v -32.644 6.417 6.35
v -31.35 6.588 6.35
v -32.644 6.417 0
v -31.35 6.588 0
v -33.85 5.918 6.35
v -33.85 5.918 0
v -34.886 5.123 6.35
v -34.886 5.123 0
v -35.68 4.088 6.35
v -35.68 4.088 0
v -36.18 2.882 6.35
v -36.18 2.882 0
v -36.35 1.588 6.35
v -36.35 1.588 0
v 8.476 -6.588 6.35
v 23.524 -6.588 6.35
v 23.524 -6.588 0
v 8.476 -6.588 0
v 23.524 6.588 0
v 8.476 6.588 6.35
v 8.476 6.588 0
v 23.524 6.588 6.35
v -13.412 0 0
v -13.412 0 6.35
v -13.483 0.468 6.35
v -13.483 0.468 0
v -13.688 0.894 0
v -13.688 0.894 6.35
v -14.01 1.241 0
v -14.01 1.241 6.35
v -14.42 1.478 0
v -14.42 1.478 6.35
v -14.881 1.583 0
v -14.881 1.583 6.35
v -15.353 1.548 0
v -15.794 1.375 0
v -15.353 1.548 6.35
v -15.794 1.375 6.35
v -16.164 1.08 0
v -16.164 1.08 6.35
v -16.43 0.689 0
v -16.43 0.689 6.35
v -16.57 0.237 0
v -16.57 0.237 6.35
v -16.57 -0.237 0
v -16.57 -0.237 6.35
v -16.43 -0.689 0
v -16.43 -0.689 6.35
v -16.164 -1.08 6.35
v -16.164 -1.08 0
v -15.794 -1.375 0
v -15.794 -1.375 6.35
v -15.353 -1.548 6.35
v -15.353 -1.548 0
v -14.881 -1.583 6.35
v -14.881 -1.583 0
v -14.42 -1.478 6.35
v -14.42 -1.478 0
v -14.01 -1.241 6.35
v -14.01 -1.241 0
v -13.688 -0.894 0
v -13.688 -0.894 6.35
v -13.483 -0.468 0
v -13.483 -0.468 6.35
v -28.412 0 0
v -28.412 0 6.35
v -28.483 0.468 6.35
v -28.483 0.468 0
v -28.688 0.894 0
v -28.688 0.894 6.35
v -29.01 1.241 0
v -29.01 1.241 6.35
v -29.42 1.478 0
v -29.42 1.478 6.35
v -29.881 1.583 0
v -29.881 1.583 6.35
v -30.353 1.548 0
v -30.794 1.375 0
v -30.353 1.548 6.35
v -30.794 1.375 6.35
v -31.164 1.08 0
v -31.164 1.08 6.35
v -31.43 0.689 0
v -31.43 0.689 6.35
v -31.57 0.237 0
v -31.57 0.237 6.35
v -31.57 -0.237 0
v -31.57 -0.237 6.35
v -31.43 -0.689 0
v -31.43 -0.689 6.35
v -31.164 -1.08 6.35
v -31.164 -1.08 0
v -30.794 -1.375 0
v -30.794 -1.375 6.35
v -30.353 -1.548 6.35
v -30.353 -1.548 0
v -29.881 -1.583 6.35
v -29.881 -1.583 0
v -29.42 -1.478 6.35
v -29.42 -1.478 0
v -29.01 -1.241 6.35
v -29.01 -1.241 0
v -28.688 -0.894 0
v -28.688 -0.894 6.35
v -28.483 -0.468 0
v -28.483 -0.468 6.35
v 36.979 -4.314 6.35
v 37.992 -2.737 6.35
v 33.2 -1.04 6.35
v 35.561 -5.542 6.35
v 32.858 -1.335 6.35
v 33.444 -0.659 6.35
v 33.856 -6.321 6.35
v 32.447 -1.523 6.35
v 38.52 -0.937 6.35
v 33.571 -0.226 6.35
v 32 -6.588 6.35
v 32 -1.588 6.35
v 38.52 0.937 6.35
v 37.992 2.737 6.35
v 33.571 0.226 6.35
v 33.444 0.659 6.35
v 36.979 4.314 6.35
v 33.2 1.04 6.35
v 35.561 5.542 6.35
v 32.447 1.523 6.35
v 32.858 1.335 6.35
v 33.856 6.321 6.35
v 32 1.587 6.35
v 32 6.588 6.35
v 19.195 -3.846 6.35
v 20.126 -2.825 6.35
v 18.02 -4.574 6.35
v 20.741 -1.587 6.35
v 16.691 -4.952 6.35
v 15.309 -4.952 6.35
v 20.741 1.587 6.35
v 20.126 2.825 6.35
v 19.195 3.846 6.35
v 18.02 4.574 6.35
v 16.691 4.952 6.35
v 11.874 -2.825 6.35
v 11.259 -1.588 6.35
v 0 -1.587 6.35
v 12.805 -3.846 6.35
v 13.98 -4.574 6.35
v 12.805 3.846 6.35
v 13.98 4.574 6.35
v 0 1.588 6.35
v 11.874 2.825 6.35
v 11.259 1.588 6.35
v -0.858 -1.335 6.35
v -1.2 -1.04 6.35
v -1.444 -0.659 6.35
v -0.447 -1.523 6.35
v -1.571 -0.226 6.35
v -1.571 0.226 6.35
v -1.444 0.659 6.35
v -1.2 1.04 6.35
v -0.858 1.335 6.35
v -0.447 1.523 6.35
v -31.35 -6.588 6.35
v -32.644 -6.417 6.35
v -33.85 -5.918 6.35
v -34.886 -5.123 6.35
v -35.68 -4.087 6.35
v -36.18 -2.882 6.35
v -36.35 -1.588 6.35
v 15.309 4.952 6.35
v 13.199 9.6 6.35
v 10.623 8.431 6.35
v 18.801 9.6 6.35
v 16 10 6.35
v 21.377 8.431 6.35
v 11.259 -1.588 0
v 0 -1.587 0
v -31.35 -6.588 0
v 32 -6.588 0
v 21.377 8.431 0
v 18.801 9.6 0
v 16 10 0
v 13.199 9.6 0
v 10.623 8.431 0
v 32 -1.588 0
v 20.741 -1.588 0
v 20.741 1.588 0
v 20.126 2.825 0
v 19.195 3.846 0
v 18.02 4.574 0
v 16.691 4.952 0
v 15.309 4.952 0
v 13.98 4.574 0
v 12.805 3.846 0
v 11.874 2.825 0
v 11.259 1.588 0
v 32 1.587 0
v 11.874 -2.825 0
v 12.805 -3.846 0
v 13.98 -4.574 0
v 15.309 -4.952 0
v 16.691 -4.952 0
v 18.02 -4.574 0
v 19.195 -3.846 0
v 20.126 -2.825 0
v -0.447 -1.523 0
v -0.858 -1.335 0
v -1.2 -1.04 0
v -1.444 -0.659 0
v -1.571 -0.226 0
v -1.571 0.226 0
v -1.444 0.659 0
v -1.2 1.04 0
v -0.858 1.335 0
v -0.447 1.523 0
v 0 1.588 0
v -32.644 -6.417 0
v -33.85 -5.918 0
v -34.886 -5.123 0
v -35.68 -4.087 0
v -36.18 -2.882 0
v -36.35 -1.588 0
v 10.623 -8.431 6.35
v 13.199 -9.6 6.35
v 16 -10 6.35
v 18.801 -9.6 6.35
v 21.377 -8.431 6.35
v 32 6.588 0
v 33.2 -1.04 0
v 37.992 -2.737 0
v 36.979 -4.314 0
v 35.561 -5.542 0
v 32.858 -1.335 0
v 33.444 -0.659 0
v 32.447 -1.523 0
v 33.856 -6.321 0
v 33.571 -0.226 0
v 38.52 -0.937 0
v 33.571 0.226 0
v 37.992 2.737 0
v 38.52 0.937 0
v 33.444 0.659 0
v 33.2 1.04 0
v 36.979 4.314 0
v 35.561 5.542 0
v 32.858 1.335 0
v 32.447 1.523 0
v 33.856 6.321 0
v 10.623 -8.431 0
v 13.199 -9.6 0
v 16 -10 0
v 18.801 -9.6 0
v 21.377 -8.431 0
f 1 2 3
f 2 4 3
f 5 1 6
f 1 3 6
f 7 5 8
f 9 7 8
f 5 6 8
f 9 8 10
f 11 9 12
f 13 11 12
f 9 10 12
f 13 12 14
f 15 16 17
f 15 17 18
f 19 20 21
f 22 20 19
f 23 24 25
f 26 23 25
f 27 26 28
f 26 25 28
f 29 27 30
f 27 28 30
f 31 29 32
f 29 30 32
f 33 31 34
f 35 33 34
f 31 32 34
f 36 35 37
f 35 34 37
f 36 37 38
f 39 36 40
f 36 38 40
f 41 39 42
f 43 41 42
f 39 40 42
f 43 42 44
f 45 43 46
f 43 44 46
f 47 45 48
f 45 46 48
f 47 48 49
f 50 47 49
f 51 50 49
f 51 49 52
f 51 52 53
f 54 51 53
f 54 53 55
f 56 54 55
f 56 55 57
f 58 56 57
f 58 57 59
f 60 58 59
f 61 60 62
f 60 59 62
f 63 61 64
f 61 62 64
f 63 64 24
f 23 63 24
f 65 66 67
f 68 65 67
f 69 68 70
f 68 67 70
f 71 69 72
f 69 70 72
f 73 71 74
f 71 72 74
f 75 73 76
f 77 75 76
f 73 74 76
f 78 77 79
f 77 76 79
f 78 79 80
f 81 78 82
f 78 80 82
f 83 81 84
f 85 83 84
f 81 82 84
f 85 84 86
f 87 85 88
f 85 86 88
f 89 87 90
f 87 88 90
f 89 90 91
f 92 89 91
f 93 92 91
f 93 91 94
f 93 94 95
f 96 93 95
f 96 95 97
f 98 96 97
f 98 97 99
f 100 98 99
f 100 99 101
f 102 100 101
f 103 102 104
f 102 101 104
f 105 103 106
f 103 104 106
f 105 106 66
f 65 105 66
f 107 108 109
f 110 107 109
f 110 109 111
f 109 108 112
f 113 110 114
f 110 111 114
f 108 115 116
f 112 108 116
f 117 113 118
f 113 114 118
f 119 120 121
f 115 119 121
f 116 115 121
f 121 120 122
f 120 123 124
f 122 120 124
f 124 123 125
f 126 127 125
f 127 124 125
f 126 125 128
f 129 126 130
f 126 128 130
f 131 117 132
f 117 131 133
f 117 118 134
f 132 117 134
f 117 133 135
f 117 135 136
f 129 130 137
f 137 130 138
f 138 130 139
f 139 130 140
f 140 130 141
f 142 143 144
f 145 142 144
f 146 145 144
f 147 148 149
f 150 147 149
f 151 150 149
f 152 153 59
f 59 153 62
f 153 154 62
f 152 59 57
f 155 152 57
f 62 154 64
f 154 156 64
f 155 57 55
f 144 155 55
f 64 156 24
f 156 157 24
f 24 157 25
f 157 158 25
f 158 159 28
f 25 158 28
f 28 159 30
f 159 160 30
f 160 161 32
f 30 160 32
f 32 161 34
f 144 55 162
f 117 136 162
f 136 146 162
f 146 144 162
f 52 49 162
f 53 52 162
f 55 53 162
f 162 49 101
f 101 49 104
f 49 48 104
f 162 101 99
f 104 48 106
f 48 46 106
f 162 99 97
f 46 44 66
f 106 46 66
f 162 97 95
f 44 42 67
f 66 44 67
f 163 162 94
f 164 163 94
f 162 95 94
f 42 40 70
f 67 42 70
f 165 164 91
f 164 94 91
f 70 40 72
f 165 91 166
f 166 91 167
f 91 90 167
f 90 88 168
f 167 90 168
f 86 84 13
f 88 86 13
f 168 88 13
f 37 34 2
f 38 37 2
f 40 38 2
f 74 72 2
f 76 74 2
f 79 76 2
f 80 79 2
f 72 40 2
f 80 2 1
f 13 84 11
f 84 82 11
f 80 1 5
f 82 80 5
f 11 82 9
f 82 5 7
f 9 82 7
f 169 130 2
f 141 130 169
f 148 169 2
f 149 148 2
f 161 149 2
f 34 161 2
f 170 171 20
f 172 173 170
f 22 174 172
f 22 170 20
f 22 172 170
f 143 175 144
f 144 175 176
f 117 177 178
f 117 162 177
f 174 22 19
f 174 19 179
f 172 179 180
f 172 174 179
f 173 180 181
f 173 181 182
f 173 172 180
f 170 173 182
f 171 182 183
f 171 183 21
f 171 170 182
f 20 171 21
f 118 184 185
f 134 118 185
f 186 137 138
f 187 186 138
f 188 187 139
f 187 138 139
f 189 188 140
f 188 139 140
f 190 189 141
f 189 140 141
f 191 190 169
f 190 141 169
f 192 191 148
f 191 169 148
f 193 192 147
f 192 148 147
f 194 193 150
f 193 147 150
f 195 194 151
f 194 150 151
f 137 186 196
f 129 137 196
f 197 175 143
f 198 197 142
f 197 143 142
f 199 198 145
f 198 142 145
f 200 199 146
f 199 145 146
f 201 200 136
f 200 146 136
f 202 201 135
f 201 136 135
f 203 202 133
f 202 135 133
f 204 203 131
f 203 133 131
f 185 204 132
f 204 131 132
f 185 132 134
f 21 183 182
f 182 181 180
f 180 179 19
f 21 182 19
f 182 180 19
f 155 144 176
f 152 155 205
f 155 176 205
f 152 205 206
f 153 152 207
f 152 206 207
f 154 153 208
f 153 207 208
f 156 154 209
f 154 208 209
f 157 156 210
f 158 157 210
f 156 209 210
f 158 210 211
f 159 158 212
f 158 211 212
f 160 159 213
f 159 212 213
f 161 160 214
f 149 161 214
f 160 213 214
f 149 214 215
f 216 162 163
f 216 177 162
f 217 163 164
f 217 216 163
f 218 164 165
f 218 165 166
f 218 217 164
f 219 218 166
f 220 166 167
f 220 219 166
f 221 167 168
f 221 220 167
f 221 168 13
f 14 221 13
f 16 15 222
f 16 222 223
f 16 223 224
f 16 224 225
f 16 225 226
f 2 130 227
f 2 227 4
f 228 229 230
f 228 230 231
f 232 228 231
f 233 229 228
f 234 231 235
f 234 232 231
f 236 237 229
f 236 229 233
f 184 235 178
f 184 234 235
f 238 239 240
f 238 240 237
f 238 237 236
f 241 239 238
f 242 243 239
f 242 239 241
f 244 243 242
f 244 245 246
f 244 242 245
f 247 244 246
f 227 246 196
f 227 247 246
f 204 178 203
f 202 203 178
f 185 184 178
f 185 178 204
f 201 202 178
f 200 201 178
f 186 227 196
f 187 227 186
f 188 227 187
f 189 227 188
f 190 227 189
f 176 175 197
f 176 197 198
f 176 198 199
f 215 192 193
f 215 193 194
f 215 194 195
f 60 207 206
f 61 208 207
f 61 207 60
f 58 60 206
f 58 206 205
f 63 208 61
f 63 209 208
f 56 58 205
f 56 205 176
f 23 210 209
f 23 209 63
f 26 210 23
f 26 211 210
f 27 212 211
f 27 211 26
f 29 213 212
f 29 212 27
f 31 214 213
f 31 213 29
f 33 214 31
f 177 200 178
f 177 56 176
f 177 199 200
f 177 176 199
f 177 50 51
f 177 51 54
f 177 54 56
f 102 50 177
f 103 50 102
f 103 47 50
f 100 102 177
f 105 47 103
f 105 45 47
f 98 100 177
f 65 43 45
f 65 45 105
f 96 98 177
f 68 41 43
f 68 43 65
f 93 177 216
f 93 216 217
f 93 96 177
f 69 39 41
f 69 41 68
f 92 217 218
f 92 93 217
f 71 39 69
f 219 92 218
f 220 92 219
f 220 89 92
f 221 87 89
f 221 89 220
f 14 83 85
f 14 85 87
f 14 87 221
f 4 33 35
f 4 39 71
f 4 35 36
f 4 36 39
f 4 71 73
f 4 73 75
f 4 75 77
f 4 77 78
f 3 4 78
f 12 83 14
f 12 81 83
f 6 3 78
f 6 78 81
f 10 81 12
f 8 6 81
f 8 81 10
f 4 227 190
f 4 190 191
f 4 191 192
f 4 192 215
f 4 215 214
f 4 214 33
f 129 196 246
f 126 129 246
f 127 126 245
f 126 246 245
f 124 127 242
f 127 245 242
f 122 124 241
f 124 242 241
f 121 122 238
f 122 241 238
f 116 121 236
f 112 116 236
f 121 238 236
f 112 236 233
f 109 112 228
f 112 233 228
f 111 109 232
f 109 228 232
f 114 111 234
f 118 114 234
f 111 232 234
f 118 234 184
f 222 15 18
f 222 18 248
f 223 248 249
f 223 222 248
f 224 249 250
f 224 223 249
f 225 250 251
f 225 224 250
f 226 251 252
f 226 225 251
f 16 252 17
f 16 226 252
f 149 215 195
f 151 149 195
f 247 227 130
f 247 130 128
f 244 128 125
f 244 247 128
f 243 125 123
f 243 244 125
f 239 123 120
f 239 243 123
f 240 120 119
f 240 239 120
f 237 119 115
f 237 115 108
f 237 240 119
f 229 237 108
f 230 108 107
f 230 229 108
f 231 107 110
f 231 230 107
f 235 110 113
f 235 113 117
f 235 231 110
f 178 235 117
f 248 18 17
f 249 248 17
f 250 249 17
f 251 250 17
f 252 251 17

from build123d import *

# Parameters (mm, degrees)
BOSS_EXTRUDE1_DEPTH   = 6.35
SKETCH2_R             = 1.5875
BOSS_EXTRUDE2_DEPTH   = 6.35
FILLET1_R             = 5
SKETCH3_R             = 5
CUT_EXTRUDE1_DEPTH    = 40.657443343
BOSS_EXTRUDE3_DEPTH   = 6.35
BOSS_EXTRUDE3_2_DEPTH = 6.35


with BuildPart() as part:
    # Sketch1 → Boss-Extrude1 (new body)
    with BuildSketch(Plane.XY):
        with BuildLine():
            Line((0, 6.5875), (32, 6.5875))
            ThreePointArc((32, 6.5875), (38.5875, 0), (32, -6.5875))
            Line((32, -6.5875), (0, -6.5875))
            ThreePointArc((0, -6.5875), (-6.5875, 0), (0, 6.5875))
        make_face()
        with BuildLine():
            Line((0, 1.5875), (32, 1.5875))
            ThreePointArc((32, 1.5875), (33.5875, 0), (32, -1.5875))
            Line((32, -1.5875), (0, -1.5875))
            ThreePointArc((0, -1.5875), (-1.5875, 0), (0, 1.5875))
        make_face(mode=Mode.SUBTRACT)
    extrude(amount=BOSS_EXTRUDE1_DEPTH)

    # Sketch2 → Boss-Extrude2 (add)
    with BuildSketch(Plane.XY.offset(6.35)):
        Polygon((-1.5875, -6.5875), (-36.35, -6.5875), (-36.35, 6.5875), (-1.5875, 6.5875), (1.809680537, 6.5875), (1.321773506, 5.998684352), (-1.5875, 4.621900503), (-1.5875, -3.765711661), (1.817888777, -6.5875), align=None)
        with Locations((-15, 0)):
            Circle(SKETCH2_R, mode=Mode.SUBTRACT)
        with Locations((-30, 0)):
            Circle(SKETCH2_R, mode=Mode.SUBTRACT)
    extrude(amount=-BOSS_EXTRUDE2_DEPTH)

    # Fillet1
    fillet1_edges = [part.edges().sort_by_distance(p)[0] for p in [
        (-36.35, -6.5875, 3.175),
        (-36.35, 6.5875, 3.175),
    ]]
    fillet(fillet1_edges, radius=FILLET1_R)

    # Sketch3 → Cut-Extrude1 (cut, through all)
    with BuildSketch(Plane.XY.offset(6.35)):
        with Locations((16, 0)):
            Circle(SKETCH3_R)
    extrude(amount=-CUT_EXTRUDE1_DEPTH, mode=Mode.SUBTRACT)


with BuildPart() as body_2:
    # Sketch4 → Boss-Extrude3 (new body)
    with BuildSketch(Plane.XY.offset(6.35)):
        with BuildLine():
            ThreePointArc((8.476380941, -6.5875), (16, -10), (23.523619059, -6.5875))
            Line((23.523619059, -6.5875), (8.476380941, -6.5875))
        make_face()
    extrude(amount=-BOSS_EXTRUDE3_DEPTH)


with BuildPart() as body_3:
    # Sketch4 → Boss-Extrude3 2 (new body)
    with BuildSketch(Plane.XY.offset(6.35)):
        with BuildLine():
            ThreePointArc((23.523619059, 6.5875), (16, 10), (8.476380941, 6.5875))
            Line((8.476380941, 6.5875), (23.523619059, 6.5875))
        make_face()
    extrude(amount=-BOSS_EXTRUDE3_2_DEPTH)


solid = Compound([part.part, body_2.part, body_3.part])
